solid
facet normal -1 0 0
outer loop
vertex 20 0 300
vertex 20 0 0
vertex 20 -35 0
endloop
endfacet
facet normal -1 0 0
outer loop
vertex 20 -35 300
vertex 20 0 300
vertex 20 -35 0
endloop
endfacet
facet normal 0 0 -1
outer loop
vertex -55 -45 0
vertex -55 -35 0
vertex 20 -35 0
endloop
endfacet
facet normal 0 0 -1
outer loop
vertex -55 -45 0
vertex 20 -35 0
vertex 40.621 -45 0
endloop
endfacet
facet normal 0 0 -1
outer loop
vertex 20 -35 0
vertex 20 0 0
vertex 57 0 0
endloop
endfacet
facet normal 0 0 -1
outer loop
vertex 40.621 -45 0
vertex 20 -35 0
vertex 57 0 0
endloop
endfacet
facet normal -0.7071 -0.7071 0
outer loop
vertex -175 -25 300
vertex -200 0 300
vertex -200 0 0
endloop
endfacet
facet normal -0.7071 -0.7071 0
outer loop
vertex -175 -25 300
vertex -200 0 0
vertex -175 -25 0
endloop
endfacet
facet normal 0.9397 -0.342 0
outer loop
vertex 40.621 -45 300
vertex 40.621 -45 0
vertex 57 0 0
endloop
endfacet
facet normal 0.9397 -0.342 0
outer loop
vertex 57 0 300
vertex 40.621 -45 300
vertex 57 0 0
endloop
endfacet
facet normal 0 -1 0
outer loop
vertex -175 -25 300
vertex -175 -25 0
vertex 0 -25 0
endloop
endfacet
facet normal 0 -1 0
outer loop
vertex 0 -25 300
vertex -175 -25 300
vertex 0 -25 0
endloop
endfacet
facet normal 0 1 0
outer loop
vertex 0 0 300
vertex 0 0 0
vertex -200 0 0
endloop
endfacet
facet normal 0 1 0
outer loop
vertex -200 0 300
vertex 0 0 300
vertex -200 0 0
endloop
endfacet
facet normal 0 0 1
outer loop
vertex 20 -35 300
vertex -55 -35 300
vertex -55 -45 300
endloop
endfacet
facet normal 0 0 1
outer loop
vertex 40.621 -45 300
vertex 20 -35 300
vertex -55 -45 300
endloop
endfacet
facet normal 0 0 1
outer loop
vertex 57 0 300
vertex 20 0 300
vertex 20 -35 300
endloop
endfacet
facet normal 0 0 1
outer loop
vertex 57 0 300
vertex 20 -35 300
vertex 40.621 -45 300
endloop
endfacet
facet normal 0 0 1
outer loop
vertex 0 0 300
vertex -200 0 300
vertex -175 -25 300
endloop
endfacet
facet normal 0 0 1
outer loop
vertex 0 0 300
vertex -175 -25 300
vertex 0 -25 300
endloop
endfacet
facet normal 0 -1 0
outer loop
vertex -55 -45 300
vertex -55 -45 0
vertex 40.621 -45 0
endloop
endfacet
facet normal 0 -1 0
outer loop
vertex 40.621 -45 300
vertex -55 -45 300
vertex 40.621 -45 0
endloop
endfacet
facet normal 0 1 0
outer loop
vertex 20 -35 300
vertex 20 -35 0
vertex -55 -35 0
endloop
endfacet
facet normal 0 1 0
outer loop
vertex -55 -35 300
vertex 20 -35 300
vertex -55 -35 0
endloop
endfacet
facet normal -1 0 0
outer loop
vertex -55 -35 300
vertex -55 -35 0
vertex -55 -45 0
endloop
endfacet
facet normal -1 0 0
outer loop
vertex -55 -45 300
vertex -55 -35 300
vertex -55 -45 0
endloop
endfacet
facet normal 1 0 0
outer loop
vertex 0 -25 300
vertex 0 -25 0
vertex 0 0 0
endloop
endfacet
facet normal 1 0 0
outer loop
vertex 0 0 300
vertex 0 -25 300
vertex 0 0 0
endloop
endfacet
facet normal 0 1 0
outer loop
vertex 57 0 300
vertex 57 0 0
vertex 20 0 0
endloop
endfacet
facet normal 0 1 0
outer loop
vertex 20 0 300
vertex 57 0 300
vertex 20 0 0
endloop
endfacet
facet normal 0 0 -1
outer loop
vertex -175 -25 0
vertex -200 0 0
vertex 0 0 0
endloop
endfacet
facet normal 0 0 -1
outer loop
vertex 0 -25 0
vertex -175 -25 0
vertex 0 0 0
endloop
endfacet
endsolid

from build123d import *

# Parameters (mm, degrees)
F1_DEPTH = 300
F3_DEPTH = 300


with BuildPart() as f1:
    # F0 (on Top) → F1 (new body)
    with BuildSketch(Plane.XY):
        Polygon((0, 0), (-200, 0), (-175, -25), (0, -25), align=None)
    extrude(amount=F1_DEPTH)


with BuildPart() as f3:
    # F2 (on Top) → F3 (new body)
    with BuildSketch(Plane.XY):
        Polygon((57, 0), (20, 0), (20, -35), (-55, -35), (-55, -45), (40.621339, -45), align=None)
    extrude(amount=F3_DEPTH)


solid = Compound([f1.part, f3.part])
